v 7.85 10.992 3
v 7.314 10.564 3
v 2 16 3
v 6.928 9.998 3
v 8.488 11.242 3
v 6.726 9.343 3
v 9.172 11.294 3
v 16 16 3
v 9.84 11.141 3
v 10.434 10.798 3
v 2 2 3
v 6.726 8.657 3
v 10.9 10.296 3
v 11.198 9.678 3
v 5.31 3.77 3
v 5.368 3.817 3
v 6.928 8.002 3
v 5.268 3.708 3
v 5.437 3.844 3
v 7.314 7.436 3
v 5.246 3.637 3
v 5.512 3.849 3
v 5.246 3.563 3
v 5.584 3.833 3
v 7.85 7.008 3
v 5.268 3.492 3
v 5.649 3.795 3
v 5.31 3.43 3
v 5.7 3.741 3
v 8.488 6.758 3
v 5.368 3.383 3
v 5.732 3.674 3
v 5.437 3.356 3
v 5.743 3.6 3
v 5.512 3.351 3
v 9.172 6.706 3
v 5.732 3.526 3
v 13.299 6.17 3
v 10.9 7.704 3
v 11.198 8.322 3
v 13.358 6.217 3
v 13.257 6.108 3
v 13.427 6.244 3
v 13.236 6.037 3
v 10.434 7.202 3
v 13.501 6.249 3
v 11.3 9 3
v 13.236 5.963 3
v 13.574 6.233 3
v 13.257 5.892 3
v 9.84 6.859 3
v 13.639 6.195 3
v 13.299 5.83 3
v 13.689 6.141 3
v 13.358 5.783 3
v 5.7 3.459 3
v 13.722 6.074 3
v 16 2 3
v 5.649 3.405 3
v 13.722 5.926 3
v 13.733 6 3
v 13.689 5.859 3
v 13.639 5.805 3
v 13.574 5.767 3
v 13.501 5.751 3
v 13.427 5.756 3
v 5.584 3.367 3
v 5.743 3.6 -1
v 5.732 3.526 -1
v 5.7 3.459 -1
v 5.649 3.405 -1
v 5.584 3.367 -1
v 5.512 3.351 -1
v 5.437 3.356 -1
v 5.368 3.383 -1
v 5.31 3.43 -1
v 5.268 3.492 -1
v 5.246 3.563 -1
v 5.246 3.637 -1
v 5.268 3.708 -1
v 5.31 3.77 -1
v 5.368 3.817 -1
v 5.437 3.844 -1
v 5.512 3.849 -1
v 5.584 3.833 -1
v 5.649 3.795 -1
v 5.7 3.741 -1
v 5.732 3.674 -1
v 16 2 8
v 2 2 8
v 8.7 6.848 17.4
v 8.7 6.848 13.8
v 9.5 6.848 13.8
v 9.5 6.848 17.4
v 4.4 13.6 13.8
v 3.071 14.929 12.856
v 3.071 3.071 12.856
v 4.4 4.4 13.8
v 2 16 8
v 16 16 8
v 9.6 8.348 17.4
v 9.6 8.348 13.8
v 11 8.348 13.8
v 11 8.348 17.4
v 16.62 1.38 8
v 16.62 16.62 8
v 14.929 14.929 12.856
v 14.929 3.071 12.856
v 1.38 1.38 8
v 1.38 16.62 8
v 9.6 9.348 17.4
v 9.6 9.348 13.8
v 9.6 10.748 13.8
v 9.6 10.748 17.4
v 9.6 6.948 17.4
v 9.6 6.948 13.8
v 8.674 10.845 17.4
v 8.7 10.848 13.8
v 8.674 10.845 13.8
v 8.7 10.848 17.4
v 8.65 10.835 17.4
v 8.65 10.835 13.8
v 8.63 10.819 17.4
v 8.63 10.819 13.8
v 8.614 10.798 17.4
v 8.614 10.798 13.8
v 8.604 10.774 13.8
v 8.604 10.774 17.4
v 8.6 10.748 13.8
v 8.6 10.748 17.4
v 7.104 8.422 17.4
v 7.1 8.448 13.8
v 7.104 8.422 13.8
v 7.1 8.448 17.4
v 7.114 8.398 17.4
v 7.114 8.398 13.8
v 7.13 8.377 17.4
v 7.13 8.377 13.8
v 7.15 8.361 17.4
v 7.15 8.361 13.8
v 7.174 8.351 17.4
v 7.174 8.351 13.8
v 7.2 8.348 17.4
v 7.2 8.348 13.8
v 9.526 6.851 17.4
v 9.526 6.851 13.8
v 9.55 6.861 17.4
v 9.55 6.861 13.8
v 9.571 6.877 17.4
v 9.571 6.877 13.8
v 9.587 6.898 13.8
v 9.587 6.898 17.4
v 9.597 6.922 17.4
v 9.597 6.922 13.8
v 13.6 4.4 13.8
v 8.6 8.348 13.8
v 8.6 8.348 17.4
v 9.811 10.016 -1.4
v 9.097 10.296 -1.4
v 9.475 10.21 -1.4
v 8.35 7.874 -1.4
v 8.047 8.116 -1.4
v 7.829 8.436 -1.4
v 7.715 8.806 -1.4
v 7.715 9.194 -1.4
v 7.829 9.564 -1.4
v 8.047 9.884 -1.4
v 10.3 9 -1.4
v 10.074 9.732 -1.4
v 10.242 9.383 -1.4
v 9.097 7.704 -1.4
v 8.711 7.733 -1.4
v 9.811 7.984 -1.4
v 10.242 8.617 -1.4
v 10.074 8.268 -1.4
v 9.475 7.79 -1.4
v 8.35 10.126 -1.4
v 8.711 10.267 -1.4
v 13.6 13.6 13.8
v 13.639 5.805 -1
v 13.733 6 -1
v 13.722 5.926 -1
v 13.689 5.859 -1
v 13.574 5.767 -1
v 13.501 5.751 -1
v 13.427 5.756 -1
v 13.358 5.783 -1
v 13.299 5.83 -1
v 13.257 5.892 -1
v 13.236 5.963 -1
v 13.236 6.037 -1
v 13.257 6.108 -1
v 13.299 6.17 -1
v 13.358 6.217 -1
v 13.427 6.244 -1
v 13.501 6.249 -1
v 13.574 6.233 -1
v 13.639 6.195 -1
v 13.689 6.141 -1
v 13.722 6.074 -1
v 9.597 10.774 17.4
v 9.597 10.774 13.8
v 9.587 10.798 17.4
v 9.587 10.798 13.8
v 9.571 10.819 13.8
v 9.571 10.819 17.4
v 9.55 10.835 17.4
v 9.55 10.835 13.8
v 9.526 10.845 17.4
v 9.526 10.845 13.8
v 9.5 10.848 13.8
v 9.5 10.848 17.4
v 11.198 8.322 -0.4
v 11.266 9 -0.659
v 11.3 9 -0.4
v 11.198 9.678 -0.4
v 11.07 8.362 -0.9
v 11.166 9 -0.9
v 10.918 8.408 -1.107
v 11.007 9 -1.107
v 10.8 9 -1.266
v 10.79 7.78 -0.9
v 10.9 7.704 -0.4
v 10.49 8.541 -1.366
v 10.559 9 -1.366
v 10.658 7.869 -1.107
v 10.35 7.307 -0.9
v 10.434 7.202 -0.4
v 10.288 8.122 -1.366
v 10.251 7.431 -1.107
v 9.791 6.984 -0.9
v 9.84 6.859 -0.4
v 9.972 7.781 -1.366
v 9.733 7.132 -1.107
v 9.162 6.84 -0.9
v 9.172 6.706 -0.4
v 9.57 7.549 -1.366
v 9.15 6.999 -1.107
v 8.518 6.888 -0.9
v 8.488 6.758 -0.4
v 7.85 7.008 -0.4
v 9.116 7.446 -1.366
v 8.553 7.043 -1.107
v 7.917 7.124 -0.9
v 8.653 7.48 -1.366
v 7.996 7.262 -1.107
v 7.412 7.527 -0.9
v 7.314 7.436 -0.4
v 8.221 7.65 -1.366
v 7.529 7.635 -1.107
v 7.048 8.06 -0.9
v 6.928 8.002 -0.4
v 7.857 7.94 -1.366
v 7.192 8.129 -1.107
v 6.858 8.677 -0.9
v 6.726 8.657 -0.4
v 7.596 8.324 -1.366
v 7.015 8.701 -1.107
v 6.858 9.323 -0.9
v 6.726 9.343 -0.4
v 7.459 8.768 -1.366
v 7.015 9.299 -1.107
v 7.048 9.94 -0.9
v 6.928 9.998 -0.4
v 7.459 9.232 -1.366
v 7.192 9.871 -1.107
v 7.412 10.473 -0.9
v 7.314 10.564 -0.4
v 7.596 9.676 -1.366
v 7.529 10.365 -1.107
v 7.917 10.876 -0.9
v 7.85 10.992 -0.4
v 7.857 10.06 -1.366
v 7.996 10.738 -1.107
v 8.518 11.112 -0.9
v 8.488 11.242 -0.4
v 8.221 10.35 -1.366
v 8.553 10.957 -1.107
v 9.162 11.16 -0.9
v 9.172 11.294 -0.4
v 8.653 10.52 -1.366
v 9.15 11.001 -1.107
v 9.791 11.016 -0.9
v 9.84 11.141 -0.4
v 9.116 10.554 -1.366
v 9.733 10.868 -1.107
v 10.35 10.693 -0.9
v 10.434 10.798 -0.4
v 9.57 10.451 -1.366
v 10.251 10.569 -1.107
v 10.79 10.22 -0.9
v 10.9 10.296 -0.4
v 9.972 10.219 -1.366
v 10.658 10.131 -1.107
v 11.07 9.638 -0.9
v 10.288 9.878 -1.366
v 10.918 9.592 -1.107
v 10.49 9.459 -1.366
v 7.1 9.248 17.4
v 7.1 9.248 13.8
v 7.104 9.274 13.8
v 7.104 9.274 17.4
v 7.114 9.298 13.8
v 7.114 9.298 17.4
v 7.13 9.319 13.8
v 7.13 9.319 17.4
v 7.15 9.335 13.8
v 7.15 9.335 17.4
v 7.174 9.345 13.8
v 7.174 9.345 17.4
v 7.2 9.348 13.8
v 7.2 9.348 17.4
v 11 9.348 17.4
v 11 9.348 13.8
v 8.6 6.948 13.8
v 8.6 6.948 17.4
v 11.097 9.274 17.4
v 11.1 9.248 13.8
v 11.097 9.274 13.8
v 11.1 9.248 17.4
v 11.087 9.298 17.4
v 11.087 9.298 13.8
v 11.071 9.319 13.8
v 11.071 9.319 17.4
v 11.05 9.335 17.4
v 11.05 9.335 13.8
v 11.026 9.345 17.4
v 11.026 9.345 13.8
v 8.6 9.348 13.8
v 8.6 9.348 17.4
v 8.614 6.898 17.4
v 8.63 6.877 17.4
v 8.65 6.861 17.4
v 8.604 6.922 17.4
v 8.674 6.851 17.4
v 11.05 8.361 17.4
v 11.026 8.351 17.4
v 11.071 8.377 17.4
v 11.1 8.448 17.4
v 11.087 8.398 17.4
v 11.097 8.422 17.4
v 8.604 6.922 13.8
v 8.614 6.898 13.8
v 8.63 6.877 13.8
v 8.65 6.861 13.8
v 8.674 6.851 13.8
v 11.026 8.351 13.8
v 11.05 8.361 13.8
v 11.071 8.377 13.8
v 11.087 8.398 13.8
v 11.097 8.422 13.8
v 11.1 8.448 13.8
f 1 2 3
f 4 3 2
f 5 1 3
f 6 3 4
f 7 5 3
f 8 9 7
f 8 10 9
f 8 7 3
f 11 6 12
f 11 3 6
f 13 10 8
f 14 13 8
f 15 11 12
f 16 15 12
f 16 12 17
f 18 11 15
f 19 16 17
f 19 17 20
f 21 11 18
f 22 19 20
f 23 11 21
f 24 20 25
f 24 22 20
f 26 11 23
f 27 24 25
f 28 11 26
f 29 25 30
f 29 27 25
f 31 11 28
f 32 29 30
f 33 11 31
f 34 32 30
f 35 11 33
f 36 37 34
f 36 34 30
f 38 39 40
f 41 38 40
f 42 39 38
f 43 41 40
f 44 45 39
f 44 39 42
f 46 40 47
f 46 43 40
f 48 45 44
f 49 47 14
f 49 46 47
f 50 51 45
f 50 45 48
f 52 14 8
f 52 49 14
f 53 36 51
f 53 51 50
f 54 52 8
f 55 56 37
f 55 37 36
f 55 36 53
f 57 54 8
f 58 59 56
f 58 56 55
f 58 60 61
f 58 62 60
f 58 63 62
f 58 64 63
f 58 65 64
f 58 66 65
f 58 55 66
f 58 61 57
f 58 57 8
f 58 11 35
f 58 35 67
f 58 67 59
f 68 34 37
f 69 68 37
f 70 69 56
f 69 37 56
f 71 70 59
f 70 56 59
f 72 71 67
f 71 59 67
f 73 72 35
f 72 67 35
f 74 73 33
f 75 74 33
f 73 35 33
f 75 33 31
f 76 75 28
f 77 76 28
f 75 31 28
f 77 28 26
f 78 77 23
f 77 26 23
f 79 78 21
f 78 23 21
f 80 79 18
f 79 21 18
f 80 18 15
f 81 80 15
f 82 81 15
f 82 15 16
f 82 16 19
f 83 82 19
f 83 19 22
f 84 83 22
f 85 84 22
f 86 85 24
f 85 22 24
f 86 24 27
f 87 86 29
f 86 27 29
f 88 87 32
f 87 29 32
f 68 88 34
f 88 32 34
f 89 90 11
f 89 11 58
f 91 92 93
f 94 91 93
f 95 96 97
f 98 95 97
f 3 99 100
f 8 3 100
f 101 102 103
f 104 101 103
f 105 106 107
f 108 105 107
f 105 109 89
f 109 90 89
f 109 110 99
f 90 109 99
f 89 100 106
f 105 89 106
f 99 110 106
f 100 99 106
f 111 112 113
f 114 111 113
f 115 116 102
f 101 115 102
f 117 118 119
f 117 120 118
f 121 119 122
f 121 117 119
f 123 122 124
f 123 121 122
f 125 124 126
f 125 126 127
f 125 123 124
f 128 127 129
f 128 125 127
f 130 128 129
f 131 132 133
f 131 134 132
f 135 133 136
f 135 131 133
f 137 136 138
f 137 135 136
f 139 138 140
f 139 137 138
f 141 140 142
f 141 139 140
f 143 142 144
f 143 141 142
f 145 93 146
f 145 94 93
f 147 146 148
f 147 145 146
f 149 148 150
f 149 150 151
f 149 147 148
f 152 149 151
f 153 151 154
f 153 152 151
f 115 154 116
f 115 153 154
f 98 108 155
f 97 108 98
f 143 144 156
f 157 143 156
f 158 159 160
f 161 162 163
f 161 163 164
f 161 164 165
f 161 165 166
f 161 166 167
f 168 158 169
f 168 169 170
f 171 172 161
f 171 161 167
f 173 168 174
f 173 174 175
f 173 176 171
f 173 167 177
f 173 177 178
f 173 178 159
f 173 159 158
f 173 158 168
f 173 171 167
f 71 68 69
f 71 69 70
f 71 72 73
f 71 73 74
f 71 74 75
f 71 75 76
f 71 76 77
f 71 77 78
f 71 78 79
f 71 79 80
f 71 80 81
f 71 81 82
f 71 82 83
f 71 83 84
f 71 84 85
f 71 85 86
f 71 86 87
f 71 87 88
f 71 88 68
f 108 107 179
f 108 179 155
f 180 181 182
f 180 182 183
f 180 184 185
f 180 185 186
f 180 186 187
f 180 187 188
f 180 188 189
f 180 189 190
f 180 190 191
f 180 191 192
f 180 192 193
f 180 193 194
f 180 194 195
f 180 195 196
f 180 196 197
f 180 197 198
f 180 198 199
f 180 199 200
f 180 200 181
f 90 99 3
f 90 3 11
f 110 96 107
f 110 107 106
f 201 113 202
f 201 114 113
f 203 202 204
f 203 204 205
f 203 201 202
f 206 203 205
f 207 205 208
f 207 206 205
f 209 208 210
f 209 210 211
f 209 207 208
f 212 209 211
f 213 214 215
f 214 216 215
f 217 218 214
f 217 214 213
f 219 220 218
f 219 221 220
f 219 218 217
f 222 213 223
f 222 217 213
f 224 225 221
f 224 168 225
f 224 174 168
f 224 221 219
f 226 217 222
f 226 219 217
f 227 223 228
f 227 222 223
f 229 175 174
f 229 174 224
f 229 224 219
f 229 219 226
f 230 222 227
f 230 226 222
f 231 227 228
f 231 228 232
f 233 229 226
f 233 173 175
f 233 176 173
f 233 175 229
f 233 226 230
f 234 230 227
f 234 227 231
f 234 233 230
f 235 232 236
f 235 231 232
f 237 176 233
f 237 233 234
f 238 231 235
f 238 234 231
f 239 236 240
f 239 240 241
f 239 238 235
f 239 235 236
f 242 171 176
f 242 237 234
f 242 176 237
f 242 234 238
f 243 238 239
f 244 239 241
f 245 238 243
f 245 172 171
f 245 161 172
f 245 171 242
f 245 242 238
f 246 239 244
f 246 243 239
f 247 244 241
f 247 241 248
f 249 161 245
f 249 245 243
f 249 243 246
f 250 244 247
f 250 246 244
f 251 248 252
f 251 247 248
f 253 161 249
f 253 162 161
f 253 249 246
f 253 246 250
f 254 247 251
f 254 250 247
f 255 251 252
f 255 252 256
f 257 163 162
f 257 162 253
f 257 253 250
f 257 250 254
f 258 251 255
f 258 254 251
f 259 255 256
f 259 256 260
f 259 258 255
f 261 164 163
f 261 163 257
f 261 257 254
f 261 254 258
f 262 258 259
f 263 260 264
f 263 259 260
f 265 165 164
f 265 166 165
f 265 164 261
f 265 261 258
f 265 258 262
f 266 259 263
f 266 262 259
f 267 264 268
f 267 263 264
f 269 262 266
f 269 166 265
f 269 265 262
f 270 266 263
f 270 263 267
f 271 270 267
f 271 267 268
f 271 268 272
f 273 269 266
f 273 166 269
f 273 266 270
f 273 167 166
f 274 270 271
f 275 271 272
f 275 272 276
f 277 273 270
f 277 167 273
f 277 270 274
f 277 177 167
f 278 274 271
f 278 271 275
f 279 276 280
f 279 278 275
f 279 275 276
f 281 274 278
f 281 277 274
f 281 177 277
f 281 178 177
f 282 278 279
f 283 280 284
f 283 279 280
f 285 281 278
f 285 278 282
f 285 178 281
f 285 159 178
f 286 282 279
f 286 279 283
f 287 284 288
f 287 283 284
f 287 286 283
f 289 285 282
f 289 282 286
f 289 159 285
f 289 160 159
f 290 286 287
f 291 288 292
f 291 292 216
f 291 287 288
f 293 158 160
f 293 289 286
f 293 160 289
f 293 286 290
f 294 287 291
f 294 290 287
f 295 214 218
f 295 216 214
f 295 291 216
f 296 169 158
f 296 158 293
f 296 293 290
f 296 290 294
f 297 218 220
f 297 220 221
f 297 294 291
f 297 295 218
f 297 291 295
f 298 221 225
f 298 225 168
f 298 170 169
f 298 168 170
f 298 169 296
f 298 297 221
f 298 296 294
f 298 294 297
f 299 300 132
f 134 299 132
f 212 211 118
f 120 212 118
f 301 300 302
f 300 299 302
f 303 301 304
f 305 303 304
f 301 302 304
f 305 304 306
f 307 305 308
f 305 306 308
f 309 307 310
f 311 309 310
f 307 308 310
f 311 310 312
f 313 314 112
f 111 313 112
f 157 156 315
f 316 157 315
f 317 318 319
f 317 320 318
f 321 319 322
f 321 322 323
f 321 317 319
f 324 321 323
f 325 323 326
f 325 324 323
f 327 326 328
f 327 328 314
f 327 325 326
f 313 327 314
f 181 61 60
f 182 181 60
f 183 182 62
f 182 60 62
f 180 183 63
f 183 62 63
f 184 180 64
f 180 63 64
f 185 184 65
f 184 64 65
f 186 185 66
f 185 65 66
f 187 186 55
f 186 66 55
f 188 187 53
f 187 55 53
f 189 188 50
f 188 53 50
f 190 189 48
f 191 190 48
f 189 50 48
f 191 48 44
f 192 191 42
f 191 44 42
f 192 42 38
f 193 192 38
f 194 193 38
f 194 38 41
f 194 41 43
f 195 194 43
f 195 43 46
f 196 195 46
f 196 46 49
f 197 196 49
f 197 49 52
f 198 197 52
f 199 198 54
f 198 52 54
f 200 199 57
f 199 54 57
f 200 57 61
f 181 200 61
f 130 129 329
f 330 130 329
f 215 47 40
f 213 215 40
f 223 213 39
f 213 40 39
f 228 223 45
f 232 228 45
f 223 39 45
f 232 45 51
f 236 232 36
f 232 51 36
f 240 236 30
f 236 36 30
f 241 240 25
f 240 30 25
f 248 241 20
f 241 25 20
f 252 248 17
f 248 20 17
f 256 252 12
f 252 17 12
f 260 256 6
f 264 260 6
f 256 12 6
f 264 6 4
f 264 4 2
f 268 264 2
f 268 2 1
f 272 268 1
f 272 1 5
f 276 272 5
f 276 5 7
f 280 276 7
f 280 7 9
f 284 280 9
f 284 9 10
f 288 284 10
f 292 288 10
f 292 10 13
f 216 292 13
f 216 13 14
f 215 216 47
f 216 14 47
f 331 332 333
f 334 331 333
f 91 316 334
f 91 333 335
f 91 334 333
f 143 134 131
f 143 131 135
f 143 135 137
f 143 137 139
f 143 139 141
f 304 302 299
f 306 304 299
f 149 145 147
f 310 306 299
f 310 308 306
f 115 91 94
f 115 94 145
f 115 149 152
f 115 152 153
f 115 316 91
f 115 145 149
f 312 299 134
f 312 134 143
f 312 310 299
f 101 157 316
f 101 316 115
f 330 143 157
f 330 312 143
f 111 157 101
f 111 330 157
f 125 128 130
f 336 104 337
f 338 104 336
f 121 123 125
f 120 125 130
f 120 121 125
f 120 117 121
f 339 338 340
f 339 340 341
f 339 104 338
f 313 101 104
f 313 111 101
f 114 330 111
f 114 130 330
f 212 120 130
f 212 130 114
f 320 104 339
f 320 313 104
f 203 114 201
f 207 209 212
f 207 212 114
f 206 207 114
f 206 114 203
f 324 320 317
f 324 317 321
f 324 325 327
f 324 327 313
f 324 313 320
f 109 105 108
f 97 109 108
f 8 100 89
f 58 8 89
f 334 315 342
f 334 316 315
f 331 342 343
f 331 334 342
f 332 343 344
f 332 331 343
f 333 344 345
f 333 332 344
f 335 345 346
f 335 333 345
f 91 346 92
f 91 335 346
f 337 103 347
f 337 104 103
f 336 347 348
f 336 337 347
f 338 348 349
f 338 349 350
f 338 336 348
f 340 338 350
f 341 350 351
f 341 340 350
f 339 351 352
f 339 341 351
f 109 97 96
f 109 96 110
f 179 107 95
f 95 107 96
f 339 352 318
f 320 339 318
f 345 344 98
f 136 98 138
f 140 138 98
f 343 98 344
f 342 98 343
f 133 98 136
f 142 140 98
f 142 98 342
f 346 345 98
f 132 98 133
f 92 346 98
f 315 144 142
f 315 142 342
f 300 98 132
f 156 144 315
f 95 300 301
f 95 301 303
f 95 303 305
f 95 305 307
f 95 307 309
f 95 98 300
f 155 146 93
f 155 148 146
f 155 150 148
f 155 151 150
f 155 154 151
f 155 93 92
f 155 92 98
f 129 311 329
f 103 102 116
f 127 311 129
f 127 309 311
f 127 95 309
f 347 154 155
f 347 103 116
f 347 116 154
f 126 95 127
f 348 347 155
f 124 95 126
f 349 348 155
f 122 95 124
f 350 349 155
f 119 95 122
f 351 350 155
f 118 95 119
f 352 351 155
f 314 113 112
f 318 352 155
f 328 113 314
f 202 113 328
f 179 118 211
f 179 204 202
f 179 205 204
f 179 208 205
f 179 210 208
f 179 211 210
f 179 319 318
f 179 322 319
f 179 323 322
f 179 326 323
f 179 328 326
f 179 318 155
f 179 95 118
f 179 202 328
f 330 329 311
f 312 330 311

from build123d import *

# Parameters (mm, degrees)
SKETCH083_W             = 14
SKETCH083_H             = 14
PAD016_DEPTH            = 5
SKETCH084_R             = 2.3
PAD017_DEPTH            = 4.4
FILLET001_R             = 1
SKETCH085_W             = 15.24
SKETCH085_H             = 15.24
PAD018_DEPTH            = 5.8
POCKET009_DEPTH         = 15.241
POCKET010_DEPTH         = 15.621
PAD019_DEPTH            = 3.6
FILLET002_R             = 0.1
CHAMFER_SIZE            = 1
SKETCH089_R             = 0.25
PAD020_DEPTH            = 4
BODY004_PLACEMENT_ANGLE = 180


with BuildPart() as part:
    # Sketch083 → Pad016 (new body)
    with BuildSketch(Plane.XY):
        with Locations((7, 7)):
            Rectangle(SKETCH083_W, SKETCH083_H)
    extrude(amount=PAD016_DEPTH)

    # Sketch084 (on Face6 of Pad016) → Pad017 (join)
    with BuildSketch(Plane.XY.offset(5)):
        with Locations((7, 7)):
            Circle(SKETCH084_R)
    extrude(amount=PAD017_DEPTH)

    # Fillet001
    fillet001_edges = [part.edges().sort_by_distance(p)[0] for p in [
        (4.7, 7, 9.4),
    ]]
    fillet(fillet001_edges, radius=FILLET001_R)

    # Sketch085 (on Face9 of Fillet001) → Pad018 (join)
    with BuildSketch(Plane(origin=(0, 0, 0), x_dir=(1, 0, 0), z_dir=(0, 0, -1))):
        with Locations((7, -7)):
            Rectangle(SKETCH085_W, SKETCH085_H)
    extrude(amount=PAD018_DEPTH)

    # Sketch086 (on Face3 of Pad018) → Pocket009 (cut, through all)
    with BuildSketch(Plane.YZ.offset(14.62)):
        Polygon((-0.62, -5.8), (1.4, -5.8), (-0.62, 0), align=None)
        Polygon((12.6, -5.8), (14.62, -5.8), (14.62, 0), align=None)
    extrude(amount=-POCKET009_DEPTH, mode=Mode.SUBTRACT)

    # Sketch087 → Pocket010 (cut, through all)
    with BuildSketch(Plane.XZ.offset(1)):
        Polygon((12.6, -5.8), (14.62, -5.8), (14.62, 0), align=None)
        Polygon((-0.62, -5.8), (1.4, -5.8), (-0.62, 0), align=None)
    extrude(amount=-POCKET010_DEPTH, mode=Mode.SUBTRACT)

    # Sketch088 (on Face10 of Pocket010) → Pad019 (join)
    with BuildSketch(Plane(origin=(0, 0, -5.8), x_dir=(1, 0, 0), z_dir=(0, 0, -1))):
        Polygon((5.100286, -6.651951), (5.100286, -7.651951), (6.600286, -7.651951), (6.600286, -9.151951), (7.600286, -9.151951), (7.600286, -7.651951), (9.100286, -7.651951), (9.100286, -6.651951), (7.600286, -6.651951), (7.600286, -5.151951), (6.600286, -5.151951), (6.600286, -6.651951), align=None)
    extrude(amount=PAD019_DEPTH)

    # Fillet002
    fillet002_edges = [part.edges().sort_by_distance(p)[0] for p in [
        (6.600286, 9.151951, -7.6),
        (7.600286, 9.151951, -7.6),
        (5.100286, 7.651951, -7.6),
        (9.100286, 7.651951, -7.6),
        (9.100286, 6.651951, -7.6),
        (7.600286, 5.151951, -7.6),
        (6.600286, 5.151951, -7.6),
        (5.100286, 6.651951, -7.6),
    ]]
    fillet(fillet002_edges, radius=FILLET002_R)

    # Chamfer
    chamfer_edges = [part.edges().sort_by_distance(p)[0] for p in [
        (12.6, 7, -5.8),
        (7, 12.6, -5.8),
        (1.4, 7, -5.8),
        (7, 1.4, -5.8),
    ]]
    chamfer(chamfer_edges, length=CHAMFER_SIZE)

    # Sketch089 (on Face36 of Chamfer) → Pad020 (join)
    with BuildSketch(Plane.XY.offset(5)):
        with Locations((11.482716, 10)):
            Circle(SKETCH089_R)
        with Locations((3.493098, 12.4)):
            Circle(SKETCH089_R)
    extrude(amount=PAD020_DEPTH)


with BuildPart() as part_1:
    # Body004 placement: moved
    add(part.part.moved(Location((2, 16, 8))).rotate(Axis((2, 16, 8), (1, 0, 0)), BODY004_PLACEMENT_ANGLE))


solid = part_1.part
